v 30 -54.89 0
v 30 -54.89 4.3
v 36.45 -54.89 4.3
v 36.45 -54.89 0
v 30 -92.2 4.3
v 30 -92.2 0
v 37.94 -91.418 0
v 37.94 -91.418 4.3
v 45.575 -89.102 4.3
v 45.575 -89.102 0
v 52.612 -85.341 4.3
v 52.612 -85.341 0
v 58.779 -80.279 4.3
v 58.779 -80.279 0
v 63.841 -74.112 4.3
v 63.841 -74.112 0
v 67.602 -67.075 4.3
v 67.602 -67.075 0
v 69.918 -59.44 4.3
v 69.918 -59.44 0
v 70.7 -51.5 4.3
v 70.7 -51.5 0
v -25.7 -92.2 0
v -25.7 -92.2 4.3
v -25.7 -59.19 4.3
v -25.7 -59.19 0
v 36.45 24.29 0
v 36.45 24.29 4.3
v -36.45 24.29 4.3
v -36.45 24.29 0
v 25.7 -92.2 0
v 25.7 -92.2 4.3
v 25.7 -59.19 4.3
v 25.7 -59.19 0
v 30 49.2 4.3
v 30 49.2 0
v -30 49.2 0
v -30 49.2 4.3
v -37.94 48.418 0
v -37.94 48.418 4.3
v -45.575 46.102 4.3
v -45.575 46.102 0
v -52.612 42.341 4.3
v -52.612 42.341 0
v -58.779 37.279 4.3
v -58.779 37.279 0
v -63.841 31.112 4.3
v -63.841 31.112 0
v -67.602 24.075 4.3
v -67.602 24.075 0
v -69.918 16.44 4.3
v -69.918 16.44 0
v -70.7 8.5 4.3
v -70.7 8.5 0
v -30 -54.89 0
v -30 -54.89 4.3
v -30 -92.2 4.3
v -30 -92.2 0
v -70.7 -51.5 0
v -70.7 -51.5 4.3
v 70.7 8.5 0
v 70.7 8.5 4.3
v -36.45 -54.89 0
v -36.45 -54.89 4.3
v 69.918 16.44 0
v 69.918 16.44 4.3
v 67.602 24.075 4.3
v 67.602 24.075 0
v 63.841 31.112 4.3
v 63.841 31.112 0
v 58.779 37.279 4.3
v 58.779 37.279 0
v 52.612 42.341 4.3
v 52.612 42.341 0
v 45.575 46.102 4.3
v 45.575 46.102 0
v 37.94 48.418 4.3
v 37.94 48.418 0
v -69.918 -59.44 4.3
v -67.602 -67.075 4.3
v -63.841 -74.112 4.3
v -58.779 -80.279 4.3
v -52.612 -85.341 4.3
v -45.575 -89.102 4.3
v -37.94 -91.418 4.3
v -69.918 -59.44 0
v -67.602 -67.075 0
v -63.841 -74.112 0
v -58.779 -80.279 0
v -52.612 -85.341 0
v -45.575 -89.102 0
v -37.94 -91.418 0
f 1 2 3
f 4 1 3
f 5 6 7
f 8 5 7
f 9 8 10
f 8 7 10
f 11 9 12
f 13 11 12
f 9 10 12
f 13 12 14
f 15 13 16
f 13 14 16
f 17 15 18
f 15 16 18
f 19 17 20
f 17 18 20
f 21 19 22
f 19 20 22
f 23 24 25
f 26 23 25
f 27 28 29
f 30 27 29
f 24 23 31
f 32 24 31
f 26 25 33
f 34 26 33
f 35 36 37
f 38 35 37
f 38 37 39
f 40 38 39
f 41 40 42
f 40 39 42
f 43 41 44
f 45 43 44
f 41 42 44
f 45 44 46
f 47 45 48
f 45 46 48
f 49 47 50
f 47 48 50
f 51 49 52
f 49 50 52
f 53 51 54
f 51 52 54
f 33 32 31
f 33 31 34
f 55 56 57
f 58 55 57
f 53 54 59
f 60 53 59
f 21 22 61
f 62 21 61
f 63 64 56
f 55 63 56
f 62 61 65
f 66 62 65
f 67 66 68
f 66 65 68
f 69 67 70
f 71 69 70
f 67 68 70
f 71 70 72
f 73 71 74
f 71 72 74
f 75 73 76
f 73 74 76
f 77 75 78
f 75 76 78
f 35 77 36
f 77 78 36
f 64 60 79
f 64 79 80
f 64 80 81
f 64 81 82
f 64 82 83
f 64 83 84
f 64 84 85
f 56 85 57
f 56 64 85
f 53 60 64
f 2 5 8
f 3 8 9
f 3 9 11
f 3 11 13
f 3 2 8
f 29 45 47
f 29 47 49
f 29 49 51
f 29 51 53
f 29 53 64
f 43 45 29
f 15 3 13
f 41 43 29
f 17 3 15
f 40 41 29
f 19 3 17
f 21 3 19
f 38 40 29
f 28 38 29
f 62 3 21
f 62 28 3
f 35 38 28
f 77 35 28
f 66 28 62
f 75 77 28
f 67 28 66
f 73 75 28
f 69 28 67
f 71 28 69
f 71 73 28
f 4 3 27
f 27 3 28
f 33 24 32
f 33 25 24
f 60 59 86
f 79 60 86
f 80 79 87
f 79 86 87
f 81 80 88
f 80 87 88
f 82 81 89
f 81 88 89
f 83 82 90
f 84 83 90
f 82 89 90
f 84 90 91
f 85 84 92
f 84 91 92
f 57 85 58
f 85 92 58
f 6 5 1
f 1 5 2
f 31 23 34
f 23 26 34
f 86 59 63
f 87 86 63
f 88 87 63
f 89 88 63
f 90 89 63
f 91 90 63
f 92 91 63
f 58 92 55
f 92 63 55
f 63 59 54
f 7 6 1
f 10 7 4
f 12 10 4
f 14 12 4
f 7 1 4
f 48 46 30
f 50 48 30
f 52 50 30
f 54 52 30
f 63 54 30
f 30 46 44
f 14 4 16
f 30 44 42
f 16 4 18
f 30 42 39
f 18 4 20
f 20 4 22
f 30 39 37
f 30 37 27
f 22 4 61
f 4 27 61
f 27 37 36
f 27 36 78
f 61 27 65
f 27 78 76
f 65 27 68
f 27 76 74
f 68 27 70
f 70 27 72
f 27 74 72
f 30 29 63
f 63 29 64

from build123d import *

# Parameters (mm, degrees)
BOSS_EXTRUDE1_DEPTH = 4.3
SKETCH2_W           = 4.3
SKETCH2_H           = 33.01
CUT_EXTRUDE1_DEPTH  = 4.3


with BuildPart() as part:
    # Sketch1 → Boss-Extrude1 (new body)
    with BuildSketch(Plane.XY):
        with BuildLine():
            Line((-0.5, -92.2), (0.5, -92.2))
            Line((0.5, -92.2), (30, -92.2))
            ThreePointArc((30, -92.2), (58.779245994, -80.279245994), (70.7, -51.5))
            Line((70.7, -51.5), (70.7, 8.5))
            ThreePointArc((70.7, 8.5), (58.779245994, 37.279245994), (30, 49.2))
            Line((30, 49.2), (-30, 49.2))
            ThreePointArc((-30, 49.2), (-58.779245994, 37.279245994), (-70.7, 8.5))
            Line((-70.7, 8.5), (-70.7, -51.5))
            ThreePointArc((-70.7, -51.5), (-58.779245994, -80.279245994), (-30, -92.2))
            Line((-30, -92.2), (-0.5, -92.2))
        make_face()
    extrude(amount=BOSS_EXTRUDE1_DEPTH)

    # Sketch2 → Cut-Extrude1 (cut)
    with BuildSketch(Plane.XY.offset(4.3)):
        Polygon((-36.45, -54.89), (-30, -54.89), (30, -54.89), (36.45, -54.89), (36.45, 24.29), (-36.45, 24.29), align=None)
        Polygon((-30, -54.89), (-30, -59.19), (-25.7, -59.19), (25.7, -59.19), (30, -59.19), (30, -54.89), align=None)
        with Locations((-27.85, -75.695)):
            Rectangle(SKETCH2_W, SKETCH2_H)
        with Locations((27.85, -75.695)):
            Rectangle(SKETCH2_W, SKETCH2_H)
    extrude(amount=-CUT_EXTRUDE1_DEPTH, mode=Mode.SUBTRACT)


solid = part.part
